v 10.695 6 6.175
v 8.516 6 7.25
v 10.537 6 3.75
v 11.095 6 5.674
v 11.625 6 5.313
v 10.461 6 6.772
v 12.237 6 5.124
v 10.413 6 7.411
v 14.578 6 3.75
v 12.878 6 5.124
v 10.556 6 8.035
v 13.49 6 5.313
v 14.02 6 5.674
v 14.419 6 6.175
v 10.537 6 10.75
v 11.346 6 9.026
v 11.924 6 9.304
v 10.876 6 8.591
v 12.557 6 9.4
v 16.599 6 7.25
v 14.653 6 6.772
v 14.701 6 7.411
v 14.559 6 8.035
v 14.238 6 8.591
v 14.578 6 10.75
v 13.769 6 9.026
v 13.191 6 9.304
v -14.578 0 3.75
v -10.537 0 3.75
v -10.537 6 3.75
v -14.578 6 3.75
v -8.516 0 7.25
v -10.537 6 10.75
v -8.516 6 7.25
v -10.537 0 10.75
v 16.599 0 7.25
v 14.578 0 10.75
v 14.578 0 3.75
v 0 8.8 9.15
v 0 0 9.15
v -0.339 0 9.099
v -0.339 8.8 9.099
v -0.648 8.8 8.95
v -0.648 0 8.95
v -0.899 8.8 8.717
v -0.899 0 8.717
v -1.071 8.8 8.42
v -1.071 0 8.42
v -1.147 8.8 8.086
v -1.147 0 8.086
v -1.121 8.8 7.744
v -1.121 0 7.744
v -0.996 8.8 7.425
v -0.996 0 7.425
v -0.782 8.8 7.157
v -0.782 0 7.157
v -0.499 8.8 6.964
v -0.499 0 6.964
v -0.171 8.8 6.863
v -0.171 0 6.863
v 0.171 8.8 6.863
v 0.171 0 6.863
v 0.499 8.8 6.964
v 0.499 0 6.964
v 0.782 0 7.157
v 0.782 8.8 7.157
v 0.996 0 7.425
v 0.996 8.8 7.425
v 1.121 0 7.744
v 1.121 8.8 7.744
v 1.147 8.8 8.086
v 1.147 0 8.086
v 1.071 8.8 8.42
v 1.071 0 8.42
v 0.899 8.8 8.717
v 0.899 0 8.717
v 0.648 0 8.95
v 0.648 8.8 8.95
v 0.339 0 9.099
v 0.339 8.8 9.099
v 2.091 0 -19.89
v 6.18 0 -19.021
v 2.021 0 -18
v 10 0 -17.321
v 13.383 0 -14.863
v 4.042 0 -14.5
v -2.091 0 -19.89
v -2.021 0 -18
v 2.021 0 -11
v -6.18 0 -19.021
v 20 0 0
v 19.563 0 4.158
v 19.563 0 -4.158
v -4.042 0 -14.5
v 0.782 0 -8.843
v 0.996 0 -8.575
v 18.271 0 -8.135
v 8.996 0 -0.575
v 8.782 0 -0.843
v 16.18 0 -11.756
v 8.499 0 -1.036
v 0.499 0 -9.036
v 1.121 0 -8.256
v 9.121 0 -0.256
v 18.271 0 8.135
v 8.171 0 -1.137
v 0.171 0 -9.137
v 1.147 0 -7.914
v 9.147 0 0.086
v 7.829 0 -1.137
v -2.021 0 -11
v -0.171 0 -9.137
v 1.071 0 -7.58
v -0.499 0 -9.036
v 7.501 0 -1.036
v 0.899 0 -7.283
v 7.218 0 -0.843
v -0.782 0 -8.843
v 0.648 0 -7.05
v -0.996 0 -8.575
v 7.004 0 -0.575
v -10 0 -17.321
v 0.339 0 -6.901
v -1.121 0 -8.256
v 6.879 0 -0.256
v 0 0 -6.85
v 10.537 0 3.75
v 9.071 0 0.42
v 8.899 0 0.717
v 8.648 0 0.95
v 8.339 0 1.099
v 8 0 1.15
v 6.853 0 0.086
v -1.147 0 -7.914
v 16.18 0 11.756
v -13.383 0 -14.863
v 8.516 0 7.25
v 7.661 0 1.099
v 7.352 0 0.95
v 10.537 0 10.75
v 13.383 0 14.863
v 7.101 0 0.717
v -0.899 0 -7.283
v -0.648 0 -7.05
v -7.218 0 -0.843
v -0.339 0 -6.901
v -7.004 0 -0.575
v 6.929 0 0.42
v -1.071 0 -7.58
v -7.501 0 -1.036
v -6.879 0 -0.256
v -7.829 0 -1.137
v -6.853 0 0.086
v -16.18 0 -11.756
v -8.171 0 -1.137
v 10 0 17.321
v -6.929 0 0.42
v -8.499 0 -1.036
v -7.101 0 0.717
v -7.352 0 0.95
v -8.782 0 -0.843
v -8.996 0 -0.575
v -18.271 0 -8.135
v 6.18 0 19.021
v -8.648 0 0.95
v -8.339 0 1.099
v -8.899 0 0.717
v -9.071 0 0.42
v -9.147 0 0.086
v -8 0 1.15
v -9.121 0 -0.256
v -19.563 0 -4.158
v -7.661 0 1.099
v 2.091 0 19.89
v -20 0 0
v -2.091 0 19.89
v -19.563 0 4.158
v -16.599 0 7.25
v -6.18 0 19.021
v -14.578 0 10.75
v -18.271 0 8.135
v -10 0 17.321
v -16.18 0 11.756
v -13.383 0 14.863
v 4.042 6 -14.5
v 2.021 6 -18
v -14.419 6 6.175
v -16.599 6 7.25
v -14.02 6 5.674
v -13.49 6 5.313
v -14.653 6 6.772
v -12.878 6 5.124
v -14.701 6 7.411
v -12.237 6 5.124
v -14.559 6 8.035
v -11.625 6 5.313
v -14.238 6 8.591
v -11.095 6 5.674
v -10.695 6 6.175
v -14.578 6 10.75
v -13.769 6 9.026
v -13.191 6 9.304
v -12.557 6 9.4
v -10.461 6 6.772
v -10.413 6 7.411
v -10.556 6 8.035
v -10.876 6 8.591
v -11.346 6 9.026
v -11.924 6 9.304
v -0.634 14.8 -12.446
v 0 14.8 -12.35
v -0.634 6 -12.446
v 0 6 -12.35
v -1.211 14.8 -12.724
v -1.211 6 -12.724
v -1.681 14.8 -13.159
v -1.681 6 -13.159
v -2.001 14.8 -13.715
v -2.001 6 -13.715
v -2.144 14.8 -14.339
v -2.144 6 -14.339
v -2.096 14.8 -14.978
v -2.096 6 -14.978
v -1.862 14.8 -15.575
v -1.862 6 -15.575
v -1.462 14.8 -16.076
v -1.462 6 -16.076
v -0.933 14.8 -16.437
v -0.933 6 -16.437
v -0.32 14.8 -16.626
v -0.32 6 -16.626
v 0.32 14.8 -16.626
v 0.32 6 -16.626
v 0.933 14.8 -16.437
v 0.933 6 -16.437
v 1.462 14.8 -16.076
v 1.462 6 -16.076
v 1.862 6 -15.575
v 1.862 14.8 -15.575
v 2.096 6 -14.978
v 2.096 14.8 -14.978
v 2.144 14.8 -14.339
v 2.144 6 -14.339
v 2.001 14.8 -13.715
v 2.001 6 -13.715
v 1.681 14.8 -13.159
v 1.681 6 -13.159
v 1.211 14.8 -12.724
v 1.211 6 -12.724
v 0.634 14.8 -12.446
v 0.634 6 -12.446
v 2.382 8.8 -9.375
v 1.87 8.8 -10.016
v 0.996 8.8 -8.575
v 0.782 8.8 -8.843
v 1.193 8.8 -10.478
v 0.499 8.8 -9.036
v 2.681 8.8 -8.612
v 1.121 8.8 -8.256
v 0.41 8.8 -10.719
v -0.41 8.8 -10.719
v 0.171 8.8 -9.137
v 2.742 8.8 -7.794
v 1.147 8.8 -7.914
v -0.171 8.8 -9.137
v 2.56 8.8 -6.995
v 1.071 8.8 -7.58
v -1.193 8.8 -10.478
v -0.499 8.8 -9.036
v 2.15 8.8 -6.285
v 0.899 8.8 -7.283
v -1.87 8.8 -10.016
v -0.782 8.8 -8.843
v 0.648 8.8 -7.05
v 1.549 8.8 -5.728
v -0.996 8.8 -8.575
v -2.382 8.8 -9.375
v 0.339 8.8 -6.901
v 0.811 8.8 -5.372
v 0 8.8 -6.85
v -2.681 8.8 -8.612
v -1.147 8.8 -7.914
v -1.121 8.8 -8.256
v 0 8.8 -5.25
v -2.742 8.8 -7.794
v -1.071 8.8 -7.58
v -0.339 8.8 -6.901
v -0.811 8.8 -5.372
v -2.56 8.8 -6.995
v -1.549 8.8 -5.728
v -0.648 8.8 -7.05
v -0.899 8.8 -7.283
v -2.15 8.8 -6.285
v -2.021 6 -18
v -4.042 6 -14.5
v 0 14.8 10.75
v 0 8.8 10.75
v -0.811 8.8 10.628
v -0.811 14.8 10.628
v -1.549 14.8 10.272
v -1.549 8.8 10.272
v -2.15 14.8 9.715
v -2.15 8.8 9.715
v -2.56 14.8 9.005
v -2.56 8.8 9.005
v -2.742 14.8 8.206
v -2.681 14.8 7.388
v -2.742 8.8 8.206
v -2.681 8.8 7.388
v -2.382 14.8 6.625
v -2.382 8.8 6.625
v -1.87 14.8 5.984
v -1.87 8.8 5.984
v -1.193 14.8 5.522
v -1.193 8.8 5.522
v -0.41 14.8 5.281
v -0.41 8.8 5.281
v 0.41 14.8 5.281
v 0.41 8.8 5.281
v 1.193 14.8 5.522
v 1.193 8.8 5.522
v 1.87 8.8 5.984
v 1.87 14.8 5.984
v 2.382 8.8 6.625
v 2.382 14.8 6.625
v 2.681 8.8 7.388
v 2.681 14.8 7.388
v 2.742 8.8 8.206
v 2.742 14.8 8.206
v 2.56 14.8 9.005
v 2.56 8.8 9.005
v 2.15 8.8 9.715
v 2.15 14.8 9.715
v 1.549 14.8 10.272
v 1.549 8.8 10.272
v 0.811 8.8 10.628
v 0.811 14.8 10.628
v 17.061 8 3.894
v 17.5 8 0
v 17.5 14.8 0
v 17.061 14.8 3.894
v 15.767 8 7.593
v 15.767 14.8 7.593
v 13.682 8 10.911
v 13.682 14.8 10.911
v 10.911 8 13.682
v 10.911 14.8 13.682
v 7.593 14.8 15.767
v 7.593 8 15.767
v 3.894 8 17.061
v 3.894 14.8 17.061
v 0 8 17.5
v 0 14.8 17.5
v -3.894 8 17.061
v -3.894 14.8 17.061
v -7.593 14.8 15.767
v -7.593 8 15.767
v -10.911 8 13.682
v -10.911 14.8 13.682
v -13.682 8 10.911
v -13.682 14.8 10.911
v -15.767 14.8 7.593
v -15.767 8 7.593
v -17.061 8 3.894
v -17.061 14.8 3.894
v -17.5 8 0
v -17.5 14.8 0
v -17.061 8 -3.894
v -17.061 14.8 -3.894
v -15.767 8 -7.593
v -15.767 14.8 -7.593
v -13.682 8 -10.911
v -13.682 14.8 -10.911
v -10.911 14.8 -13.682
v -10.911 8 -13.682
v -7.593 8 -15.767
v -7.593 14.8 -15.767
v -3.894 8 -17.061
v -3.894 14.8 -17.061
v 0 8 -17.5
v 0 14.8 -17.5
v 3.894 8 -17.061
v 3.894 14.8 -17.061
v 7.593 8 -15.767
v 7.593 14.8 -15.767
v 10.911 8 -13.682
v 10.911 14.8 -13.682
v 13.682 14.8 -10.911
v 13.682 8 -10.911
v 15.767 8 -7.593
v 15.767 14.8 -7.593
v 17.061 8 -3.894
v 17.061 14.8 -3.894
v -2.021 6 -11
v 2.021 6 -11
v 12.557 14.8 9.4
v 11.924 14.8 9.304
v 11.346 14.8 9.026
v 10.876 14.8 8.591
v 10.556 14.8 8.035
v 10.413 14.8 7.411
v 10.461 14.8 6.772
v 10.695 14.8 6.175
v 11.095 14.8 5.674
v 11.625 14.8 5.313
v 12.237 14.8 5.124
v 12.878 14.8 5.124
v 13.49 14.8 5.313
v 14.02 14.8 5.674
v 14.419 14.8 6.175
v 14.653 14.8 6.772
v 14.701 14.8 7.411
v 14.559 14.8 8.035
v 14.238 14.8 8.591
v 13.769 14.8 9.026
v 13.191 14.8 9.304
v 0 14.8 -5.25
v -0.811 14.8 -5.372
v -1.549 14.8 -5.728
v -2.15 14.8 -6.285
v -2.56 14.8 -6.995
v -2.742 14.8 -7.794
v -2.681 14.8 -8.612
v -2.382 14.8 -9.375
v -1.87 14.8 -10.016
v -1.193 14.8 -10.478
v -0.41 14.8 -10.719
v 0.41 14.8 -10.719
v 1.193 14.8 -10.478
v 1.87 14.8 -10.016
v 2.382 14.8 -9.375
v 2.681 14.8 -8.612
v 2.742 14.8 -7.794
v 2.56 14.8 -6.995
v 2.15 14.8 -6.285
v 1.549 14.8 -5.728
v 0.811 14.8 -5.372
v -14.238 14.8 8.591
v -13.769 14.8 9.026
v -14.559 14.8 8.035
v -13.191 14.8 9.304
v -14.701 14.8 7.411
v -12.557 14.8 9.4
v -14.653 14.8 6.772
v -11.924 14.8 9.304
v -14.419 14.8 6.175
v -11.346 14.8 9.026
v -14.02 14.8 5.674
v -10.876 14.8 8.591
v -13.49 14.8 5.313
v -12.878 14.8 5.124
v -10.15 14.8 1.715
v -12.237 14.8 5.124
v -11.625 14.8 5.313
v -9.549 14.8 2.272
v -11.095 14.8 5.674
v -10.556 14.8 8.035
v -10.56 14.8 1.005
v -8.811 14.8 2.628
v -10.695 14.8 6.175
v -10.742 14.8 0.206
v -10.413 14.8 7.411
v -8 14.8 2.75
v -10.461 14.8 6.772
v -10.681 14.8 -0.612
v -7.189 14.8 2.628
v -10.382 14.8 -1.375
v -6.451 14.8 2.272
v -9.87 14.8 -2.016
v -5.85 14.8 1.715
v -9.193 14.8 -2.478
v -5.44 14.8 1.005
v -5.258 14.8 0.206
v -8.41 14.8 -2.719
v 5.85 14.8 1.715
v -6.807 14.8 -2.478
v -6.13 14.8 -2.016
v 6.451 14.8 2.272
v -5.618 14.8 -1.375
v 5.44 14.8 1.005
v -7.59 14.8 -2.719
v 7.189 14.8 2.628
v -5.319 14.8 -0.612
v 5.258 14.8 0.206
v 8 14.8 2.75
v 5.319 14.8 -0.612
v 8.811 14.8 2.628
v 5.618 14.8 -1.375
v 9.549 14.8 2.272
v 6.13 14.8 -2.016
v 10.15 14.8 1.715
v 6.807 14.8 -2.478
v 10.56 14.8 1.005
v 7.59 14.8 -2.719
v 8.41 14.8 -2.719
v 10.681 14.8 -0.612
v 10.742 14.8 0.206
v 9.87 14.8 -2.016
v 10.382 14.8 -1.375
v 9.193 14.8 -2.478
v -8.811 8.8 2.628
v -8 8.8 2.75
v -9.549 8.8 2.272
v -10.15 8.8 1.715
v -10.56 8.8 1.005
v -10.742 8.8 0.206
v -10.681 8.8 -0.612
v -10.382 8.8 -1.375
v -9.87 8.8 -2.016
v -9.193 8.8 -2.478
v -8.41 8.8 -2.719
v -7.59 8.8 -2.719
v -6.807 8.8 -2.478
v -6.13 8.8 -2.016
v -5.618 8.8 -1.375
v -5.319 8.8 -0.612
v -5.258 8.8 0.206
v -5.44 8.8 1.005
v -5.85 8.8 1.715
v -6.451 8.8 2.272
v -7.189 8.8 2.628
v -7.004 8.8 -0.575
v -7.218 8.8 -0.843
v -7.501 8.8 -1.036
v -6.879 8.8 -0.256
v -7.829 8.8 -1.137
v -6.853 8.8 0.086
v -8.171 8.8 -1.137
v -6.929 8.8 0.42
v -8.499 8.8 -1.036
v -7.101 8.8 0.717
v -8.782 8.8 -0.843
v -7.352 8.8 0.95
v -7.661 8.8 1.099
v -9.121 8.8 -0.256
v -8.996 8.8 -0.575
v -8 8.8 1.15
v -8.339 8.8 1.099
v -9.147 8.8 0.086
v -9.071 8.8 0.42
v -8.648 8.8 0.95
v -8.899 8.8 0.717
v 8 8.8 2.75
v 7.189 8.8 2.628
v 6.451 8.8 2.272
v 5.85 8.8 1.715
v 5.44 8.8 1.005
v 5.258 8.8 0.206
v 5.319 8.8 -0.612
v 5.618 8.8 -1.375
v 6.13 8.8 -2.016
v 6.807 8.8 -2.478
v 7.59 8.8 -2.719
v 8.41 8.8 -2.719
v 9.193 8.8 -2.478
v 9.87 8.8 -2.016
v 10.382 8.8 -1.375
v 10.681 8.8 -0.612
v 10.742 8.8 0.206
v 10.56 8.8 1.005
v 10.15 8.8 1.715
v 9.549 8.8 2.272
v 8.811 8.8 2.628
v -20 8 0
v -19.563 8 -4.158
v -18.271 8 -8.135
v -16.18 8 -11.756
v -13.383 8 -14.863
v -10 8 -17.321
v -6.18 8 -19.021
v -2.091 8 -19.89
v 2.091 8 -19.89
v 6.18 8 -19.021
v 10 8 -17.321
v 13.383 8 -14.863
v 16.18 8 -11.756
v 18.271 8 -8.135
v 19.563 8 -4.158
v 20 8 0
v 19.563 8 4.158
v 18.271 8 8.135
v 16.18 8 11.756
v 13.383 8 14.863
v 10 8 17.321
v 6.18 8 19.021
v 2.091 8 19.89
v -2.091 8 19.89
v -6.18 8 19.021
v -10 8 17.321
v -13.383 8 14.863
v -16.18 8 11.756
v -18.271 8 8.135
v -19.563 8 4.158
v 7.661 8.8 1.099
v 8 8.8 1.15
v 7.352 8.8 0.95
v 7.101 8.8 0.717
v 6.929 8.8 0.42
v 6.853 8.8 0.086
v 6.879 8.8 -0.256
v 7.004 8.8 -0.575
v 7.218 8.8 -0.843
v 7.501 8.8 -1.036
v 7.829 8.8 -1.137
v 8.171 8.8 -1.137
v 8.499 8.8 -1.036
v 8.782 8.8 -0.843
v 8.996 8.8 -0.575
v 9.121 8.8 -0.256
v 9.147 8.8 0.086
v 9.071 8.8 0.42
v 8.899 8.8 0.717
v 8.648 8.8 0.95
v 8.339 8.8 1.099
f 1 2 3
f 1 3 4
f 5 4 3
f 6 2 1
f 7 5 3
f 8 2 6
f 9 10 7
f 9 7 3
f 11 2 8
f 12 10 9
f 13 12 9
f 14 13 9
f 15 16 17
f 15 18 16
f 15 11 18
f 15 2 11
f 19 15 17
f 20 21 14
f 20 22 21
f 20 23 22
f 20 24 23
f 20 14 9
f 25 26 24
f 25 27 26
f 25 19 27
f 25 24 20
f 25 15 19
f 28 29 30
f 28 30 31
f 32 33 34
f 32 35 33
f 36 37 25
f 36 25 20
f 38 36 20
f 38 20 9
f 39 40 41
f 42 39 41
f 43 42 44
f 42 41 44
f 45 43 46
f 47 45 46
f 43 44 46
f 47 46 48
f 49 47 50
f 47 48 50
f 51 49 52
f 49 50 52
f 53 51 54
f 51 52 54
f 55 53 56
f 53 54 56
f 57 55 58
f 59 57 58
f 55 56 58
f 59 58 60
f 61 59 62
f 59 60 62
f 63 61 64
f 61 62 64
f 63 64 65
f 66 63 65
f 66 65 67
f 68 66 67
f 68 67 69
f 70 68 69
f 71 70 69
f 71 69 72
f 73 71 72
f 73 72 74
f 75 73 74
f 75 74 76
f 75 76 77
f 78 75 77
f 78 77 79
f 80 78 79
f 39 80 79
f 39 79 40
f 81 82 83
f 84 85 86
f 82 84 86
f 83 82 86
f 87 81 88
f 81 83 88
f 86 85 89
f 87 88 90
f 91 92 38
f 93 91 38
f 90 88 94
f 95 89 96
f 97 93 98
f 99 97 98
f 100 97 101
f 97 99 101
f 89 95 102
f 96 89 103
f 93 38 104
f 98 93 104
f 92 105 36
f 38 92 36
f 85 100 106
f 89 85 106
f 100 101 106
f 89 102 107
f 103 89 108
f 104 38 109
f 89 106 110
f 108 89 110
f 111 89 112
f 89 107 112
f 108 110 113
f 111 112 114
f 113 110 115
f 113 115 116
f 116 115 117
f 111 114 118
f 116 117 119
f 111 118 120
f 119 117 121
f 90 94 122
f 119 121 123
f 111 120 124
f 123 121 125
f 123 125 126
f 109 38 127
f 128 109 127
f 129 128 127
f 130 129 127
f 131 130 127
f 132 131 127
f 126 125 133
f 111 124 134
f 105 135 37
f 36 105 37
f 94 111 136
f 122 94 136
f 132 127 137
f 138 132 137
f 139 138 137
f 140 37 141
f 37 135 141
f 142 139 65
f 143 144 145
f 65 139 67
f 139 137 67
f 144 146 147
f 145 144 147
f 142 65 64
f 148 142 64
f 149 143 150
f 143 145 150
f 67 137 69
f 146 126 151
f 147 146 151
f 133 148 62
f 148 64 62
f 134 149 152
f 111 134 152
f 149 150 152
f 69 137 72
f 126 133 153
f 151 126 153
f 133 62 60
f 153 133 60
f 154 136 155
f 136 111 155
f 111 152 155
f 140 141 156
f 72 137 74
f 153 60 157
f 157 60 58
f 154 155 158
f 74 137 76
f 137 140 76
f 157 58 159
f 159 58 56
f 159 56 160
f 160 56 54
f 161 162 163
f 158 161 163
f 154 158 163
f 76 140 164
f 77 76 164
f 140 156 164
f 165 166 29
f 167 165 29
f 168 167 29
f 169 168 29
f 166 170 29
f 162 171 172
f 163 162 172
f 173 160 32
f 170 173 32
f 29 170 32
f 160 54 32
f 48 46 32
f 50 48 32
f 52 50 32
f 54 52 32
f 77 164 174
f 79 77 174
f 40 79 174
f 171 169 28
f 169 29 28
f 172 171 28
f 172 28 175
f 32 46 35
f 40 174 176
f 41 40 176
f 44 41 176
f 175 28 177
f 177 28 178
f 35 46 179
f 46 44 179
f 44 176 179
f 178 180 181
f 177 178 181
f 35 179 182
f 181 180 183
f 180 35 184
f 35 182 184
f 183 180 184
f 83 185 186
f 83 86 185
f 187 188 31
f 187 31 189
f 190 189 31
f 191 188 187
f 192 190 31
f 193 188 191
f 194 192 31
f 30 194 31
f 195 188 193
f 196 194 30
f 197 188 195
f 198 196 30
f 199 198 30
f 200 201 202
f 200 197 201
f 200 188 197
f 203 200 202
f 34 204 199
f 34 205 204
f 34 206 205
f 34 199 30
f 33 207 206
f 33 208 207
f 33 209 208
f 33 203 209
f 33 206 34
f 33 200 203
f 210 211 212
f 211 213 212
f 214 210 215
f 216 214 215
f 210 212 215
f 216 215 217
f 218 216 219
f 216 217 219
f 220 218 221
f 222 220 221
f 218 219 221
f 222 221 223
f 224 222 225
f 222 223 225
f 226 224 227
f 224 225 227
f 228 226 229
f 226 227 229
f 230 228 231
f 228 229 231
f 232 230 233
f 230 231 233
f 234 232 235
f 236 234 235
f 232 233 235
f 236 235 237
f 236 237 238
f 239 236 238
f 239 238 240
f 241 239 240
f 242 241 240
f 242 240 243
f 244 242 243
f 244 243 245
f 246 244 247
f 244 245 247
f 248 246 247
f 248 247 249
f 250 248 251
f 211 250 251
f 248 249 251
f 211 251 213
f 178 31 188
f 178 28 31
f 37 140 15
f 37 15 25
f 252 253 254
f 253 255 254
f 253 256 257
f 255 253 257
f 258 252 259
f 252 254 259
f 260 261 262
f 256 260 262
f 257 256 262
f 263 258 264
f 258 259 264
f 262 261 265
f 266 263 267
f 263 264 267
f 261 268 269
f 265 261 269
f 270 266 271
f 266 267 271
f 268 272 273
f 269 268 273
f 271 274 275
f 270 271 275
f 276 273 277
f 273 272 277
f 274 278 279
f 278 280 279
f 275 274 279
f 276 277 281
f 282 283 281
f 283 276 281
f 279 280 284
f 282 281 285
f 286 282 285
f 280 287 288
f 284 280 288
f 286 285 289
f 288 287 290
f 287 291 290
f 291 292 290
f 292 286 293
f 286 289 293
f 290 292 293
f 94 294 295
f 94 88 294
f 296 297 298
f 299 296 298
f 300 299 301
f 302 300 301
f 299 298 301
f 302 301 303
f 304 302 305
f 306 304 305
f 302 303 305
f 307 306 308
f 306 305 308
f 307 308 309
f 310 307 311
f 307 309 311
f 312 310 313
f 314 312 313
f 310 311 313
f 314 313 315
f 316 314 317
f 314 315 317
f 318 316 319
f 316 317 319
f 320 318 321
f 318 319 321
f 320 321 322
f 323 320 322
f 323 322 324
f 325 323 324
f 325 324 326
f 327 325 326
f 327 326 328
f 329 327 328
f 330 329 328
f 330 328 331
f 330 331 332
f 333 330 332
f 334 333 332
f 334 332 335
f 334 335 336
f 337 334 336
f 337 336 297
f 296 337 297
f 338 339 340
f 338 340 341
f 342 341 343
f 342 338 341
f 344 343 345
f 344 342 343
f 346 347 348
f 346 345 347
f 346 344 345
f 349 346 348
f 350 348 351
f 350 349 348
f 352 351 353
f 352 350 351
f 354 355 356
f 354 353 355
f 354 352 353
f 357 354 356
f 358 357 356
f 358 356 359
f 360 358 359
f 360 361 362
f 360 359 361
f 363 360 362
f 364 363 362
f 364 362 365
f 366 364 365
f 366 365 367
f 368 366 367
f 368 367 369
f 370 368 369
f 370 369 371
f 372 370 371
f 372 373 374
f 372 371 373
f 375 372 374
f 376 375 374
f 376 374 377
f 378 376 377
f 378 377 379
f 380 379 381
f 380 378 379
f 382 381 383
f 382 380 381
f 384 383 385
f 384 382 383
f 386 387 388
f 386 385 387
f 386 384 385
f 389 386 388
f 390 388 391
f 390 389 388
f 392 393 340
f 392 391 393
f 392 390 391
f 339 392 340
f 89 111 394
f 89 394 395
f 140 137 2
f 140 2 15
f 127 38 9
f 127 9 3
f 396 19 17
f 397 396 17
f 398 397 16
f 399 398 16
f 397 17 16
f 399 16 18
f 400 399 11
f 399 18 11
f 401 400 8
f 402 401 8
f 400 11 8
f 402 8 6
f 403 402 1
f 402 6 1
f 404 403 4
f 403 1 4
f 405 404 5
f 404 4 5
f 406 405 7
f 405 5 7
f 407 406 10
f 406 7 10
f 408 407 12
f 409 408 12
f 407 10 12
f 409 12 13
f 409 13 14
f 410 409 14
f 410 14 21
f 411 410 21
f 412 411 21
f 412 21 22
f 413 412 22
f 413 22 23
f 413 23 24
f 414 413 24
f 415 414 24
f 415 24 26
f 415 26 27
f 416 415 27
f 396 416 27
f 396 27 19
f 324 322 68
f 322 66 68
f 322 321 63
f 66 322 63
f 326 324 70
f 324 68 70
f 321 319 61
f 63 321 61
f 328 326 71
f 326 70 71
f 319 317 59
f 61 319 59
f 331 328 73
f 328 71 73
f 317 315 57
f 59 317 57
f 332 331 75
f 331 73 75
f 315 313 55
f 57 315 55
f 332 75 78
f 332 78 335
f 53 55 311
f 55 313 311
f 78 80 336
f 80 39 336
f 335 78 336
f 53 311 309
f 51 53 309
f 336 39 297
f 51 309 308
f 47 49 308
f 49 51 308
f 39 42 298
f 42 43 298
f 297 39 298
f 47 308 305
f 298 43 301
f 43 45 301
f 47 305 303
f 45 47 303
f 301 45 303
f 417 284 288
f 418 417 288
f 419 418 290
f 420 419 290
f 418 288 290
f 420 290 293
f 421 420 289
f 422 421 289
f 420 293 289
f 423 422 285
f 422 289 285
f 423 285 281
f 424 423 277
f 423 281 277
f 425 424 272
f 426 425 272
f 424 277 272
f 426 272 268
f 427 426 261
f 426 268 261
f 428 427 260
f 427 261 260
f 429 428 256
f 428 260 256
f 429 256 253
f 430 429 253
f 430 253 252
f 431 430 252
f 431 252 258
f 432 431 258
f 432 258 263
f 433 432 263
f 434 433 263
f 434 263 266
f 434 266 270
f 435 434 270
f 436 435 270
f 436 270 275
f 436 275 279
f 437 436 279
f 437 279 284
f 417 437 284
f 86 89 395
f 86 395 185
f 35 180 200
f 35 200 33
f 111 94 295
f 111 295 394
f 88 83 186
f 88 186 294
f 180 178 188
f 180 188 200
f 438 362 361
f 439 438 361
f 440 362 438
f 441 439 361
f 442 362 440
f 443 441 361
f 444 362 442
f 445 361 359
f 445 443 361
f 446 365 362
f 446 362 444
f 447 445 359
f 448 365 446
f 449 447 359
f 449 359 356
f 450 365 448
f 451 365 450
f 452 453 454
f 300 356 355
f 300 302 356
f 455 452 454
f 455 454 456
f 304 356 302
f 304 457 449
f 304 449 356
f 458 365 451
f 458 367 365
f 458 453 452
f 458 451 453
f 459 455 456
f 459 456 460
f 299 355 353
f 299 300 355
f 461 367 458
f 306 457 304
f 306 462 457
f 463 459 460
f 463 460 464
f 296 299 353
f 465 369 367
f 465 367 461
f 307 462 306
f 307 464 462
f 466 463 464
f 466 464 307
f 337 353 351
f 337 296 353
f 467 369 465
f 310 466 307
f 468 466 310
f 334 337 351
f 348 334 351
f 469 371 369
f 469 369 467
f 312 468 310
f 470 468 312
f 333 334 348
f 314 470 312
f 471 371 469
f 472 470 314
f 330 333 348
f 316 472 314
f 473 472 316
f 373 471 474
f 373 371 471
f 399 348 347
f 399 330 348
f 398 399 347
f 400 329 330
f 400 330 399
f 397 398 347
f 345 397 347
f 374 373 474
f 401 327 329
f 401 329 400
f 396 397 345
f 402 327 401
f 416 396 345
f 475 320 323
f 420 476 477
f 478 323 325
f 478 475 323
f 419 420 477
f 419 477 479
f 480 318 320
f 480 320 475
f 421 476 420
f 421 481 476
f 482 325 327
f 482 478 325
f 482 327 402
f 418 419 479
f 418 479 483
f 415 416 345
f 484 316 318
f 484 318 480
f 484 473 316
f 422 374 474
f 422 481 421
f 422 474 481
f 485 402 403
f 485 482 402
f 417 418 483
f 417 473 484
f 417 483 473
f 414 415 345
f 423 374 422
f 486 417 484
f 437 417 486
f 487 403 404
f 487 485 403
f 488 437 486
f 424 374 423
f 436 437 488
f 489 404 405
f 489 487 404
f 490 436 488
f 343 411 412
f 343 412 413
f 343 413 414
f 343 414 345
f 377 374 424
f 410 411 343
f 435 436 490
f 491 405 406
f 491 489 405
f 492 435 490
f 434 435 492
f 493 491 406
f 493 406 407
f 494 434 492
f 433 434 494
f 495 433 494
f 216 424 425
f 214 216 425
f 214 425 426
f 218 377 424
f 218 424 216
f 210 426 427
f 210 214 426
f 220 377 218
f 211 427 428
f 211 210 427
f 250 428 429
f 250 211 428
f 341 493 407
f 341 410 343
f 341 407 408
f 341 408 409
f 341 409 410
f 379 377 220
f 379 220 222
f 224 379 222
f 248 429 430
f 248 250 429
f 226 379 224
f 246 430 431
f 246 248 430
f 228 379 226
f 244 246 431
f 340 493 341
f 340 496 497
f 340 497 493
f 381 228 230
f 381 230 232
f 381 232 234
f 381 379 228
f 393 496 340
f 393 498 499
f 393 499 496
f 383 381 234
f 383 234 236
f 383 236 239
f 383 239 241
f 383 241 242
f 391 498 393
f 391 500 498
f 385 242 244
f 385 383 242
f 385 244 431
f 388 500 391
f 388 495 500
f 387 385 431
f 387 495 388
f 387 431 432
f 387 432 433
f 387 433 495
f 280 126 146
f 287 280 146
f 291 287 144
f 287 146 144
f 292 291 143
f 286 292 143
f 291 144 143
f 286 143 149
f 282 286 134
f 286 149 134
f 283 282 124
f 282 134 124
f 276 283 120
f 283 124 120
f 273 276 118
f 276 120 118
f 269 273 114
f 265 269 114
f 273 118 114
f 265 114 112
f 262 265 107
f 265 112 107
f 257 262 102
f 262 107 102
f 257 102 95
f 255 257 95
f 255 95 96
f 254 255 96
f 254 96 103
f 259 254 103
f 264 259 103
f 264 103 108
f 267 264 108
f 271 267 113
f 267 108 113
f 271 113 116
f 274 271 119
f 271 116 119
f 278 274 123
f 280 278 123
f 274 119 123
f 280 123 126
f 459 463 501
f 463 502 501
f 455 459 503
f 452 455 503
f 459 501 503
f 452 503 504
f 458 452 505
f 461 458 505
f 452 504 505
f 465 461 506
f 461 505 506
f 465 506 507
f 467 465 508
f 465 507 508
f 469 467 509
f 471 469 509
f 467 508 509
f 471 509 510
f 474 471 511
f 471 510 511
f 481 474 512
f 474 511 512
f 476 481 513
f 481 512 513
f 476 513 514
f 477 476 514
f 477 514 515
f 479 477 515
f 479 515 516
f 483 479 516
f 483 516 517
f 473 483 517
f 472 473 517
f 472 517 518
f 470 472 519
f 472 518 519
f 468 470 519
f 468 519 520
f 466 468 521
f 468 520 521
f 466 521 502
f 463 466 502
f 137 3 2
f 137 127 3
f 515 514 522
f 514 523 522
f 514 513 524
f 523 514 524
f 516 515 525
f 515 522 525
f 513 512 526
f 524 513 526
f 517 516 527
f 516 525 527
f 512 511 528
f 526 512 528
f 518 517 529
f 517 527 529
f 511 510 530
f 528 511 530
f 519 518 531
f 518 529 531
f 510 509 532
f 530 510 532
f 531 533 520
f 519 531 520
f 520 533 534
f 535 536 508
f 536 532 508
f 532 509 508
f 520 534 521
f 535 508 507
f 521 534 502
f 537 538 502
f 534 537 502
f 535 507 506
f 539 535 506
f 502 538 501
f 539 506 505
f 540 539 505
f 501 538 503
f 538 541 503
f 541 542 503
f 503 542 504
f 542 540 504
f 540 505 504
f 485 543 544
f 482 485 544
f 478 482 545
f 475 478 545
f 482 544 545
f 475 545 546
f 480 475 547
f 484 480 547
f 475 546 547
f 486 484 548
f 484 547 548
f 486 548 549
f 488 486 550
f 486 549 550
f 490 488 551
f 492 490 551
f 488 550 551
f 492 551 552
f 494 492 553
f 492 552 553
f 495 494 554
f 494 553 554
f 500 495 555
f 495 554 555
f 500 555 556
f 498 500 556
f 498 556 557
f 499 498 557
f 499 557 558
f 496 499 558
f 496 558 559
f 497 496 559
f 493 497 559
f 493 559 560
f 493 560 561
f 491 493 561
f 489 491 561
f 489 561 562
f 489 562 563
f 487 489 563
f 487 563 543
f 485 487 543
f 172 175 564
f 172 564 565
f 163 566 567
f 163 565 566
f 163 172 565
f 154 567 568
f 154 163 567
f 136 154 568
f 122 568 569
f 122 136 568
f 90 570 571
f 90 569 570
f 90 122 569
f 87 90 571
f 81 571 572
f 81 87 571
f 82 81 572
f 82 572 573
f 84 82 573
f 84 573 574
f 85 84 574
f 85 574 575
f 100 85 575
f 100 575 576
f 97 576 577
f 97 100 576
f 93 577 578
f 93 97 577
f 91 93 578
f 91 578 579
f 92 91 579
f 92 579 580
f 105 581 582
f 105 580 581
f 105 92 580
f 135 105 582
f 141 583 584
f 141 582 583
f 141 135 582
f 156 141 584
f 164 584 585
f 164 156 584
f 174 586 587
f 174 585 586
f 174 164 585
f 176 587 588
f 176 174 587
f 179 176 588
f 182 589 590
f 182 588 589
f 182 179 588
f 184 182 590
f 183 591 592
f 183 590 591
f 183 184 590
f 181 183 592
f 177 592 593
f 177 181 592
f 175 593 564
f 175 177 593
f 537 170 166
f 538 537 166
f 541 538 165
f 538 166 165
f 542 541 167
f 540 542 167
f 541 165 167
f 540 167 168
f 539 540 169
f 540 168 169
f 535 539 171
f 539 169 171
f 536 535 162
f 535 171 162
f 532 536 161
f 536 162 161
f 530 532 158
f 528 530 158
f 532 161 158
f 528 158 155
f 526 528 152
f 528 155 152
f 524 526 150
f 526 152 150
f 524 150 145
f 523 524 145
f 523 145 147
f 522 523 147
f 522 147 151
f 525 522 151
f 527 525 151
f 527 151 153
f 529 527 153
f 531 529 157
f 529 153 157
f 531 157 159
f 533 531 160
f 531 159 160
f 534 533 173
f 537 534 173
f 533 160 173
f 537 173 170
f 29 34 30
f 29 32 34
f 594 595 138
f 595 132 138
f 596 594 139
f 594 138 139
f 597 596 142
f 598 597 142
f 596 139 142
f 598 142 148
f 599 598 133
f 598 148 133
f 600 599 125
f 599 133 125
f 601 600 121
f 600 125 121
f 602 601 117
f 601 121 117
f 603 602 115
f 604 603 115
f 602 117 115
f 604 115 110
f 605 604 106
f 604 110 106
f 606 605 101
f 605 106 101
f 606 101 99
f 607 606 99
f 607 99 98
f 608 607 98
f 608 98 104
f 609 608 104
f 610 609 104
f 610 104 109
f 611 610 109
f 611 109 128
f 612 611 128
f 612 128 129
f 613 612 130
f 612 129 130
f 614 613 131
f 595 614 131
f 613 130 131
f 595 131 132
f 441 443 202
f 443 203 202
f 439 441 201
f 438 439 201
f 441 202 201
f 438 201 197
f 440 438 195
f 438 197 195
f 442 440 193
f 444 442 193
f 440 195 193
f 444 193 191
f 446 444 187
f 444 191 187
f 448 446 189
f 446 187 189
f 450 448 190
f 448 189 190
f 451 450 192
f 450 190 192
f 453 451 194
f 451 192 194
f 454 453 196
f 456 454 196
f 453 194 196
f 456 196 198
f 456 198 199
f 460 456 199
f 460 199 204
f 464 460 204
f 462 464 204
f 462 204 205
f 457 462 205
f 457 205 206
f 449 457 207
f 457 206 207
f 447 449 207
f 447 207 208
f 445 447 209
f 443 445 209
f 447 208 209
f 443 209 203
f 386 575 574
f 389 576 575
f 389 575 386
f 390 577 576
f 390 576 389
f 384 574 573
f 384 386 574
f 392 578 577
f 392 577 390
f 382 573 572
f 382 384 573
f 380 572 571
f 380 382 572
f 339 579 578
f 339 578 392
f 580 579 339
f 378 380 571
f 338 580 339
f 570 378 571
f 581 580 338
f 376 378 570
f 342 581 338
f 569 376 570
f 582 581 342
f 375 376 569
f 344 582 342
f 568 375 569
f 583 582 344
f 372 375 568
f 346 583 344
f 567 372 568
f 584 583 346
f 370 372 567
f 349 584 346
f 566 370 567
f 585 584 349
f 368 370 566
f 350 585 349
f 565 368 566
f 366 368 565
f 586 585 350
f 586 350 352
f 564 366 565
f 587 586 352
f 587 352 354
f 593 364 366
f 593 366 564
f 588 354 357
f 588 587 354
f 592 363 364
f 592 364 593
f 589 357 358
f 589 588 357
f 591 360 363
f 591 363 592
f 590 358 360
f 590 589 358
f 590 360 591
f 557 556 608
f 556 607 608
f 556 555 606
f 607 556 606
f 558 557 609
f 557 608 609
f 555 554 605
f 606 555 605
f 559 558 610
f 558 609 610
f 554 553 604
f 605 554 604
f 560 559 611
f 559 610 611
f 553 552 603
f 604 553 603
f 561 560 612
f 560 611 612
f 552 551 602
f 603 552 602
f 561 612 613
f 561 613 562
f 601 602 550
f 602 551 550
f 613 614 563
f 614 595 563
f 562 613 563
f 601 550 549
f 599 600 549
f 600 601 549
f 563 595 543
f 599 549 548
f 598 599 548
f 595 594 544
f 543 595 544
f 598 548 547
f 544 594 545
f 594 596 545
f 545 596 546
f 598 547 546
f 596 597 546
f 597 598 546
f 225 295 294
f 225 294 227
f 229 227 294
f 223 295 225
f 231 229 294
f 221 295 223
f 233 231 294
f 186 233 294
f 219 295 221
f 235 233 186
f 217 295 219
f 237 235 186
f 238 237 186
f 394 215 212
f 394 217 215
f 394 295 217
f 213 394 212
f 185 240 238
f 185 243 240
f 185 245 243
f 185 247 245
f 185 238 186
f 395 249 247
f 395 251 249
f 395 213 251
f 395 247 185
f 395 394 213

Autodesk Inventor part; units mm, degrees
ref_plane "YZ Plane" through (0, 0, 0) normal (1, 0, 0) x (0, 1, 0)
ref_plane "XZ Plane" through (0, 0, 0) normal (0, 1, 0) x (-1, 0, 0)
ref_plane "XY Plane" through (0, 0, 0) normal (0, 0, 1) x (1, 0, 0)
sketch "Sketch1" plane through (0, 0, 0) normal (0, 1, 0) x (-1, 0, 0)
  circle A0 centre (0, 0) radius 8 construction
  circle A1 centre (8, 0) radius 1 construction
  circle A2 centre (0, -8) radius 1 construction
  circle A3 centre (-8, 0) radius 1 construction
  circle A4 centre (0, 8) radius 1 construction
  circle A5 centre (13, 0) radius 2 construction
  circle A6 centre (-6.5, 11.2583) radius 2 construction
  circle A7 centre (-6.5, -11.2583) radius 2 construction
  line L0 (13, 0) -> (0, 0)
  line L1 (0, 0) -> (0, -5.456)
  circle A8 centre (0, 0) radius 20
  dimension "d0" = 16
  dimension "d1" = 2
  dimension "d2" = 2
  dimension "d3" = 2
  dimension "d4" = 2
  dimension "d5" = 4
  dimension "d8" = 360
  dimension "d10" = 13
  dimension "d11" = 90
  dimension "d12" = 40
extrude "Extrusion1" add sketch "Sketch1" along normal blind 8
sketch "Sketch2" plane through (0, 8, 0) normal (0, 1, 0) x (1, 0, 0)
  circle A0 centre (0, 0) radius 17.5
  dimension "d15" = 35
extrude "Extrusion2" add sketch "Sketch2" along normal blind 6.8
sketch "Sketch3" plane through (0, 14.8, 0) normal (0, 1, 0) x (1, 0, 0)
  circle A0 centre (0, -8) radius 1 construction
  circle A1 centre (-8, 0) radius 1 construction
  circle A2 centre (0, 8) radius 1 construction
  circle A3 centre (8, 0) radius 1 construction
  point P0 (0, 0)
hole "Hole1" at (0, 14.8, -8) at (-8, 14.8, 0) at (0, 14.8, 8) at (8, 14.8, 0) direction (0, -1, 0) diameter 2.3 end through all counterbore diameter 5.5 counterbore depth 6
sketch "Sketch4" plane through (0, 14.8, 0) normal (0, 1, 0) x (1, 0, 0)
  circle A0 centre (0, 0) radius 14.5
  point P0 (0, 14.5)
  point P1 (-12.5574, -7.25)
  point P2 (12.5574, -7.25)
  dimension "d27" = 29
  dimension "d30" = 360
hole "Hole2" at (0, 14.8, -14.5) at (-12.5574, 14.8, 7.25) at (12.5574, 14.8, 7.25) direction (0, -1, 0) diameter 4.3 end through all
sketch "Sketch5" plane through (0, 0, 0) normal (0, -1, 0) x (1, 0, 0)
  circle A0 centre (-12.5574, 7.25) radius 2.15 construction
  circle A1 centre (12.5574, 7.25) radius 2.15 construction
  circle A2 centre (0, -14.5) radius 2.15 construction
  line L0 (4.0415, -14.5) -> (2.0207, -18)
  line L1 (2.0207, -18) -> (-2.0207, -18)
  line L2 (-2.0207, -18) -> (-4.0415, -14.5)
  line L3 (-4.0415, -14.5) -> (-2.0207, -11)
  line L4 (-2.0207, -11) -> (2.0207, -11)
  line L5 (2.0207, -11) -> (4.0415, -14.5)
  line L6 (14.5781, 10.75) -> (16.5988, 7.25)
  line L7 (10.5366, 10.75) -> (14.5781, 10.75)
  line L8 (8.5159, 7.25) -> (10.5366, 10.75)
  line L9 (10.5366, 3.75) -> (8.5159, 7.25)
  line L10 (14.5781, 3.75) -> (10.5366, 3.75)
  line L11 (16.5988, 7.25) -> (14.5781, 3.75)
  line L12 (-16.5988, 7.25) -> (-14.5781, 10.75)
  line L13 (-14.5781, 3.75) -> (-16.5988, 7.25)
  line L14 (-10.5366, 3.75) -> (-14.5781, 3.75)
  line L15 (-8.5159, 7.25) -> (-10.5366, 3.75)
  line L16 (-10.5366, 10.75) -> (-8.5159, 7.25)
  line L17 (-14.5781, 10.75) -> (-10.5366, 10.75)
  point P0 (0, 0)
  dimension "d39" = 7
  dimension "d42" = 360
extrude "Extrusion3" cut sketch "Sketch5" against normal blind 6
properties part number "Arm - slew column A"
